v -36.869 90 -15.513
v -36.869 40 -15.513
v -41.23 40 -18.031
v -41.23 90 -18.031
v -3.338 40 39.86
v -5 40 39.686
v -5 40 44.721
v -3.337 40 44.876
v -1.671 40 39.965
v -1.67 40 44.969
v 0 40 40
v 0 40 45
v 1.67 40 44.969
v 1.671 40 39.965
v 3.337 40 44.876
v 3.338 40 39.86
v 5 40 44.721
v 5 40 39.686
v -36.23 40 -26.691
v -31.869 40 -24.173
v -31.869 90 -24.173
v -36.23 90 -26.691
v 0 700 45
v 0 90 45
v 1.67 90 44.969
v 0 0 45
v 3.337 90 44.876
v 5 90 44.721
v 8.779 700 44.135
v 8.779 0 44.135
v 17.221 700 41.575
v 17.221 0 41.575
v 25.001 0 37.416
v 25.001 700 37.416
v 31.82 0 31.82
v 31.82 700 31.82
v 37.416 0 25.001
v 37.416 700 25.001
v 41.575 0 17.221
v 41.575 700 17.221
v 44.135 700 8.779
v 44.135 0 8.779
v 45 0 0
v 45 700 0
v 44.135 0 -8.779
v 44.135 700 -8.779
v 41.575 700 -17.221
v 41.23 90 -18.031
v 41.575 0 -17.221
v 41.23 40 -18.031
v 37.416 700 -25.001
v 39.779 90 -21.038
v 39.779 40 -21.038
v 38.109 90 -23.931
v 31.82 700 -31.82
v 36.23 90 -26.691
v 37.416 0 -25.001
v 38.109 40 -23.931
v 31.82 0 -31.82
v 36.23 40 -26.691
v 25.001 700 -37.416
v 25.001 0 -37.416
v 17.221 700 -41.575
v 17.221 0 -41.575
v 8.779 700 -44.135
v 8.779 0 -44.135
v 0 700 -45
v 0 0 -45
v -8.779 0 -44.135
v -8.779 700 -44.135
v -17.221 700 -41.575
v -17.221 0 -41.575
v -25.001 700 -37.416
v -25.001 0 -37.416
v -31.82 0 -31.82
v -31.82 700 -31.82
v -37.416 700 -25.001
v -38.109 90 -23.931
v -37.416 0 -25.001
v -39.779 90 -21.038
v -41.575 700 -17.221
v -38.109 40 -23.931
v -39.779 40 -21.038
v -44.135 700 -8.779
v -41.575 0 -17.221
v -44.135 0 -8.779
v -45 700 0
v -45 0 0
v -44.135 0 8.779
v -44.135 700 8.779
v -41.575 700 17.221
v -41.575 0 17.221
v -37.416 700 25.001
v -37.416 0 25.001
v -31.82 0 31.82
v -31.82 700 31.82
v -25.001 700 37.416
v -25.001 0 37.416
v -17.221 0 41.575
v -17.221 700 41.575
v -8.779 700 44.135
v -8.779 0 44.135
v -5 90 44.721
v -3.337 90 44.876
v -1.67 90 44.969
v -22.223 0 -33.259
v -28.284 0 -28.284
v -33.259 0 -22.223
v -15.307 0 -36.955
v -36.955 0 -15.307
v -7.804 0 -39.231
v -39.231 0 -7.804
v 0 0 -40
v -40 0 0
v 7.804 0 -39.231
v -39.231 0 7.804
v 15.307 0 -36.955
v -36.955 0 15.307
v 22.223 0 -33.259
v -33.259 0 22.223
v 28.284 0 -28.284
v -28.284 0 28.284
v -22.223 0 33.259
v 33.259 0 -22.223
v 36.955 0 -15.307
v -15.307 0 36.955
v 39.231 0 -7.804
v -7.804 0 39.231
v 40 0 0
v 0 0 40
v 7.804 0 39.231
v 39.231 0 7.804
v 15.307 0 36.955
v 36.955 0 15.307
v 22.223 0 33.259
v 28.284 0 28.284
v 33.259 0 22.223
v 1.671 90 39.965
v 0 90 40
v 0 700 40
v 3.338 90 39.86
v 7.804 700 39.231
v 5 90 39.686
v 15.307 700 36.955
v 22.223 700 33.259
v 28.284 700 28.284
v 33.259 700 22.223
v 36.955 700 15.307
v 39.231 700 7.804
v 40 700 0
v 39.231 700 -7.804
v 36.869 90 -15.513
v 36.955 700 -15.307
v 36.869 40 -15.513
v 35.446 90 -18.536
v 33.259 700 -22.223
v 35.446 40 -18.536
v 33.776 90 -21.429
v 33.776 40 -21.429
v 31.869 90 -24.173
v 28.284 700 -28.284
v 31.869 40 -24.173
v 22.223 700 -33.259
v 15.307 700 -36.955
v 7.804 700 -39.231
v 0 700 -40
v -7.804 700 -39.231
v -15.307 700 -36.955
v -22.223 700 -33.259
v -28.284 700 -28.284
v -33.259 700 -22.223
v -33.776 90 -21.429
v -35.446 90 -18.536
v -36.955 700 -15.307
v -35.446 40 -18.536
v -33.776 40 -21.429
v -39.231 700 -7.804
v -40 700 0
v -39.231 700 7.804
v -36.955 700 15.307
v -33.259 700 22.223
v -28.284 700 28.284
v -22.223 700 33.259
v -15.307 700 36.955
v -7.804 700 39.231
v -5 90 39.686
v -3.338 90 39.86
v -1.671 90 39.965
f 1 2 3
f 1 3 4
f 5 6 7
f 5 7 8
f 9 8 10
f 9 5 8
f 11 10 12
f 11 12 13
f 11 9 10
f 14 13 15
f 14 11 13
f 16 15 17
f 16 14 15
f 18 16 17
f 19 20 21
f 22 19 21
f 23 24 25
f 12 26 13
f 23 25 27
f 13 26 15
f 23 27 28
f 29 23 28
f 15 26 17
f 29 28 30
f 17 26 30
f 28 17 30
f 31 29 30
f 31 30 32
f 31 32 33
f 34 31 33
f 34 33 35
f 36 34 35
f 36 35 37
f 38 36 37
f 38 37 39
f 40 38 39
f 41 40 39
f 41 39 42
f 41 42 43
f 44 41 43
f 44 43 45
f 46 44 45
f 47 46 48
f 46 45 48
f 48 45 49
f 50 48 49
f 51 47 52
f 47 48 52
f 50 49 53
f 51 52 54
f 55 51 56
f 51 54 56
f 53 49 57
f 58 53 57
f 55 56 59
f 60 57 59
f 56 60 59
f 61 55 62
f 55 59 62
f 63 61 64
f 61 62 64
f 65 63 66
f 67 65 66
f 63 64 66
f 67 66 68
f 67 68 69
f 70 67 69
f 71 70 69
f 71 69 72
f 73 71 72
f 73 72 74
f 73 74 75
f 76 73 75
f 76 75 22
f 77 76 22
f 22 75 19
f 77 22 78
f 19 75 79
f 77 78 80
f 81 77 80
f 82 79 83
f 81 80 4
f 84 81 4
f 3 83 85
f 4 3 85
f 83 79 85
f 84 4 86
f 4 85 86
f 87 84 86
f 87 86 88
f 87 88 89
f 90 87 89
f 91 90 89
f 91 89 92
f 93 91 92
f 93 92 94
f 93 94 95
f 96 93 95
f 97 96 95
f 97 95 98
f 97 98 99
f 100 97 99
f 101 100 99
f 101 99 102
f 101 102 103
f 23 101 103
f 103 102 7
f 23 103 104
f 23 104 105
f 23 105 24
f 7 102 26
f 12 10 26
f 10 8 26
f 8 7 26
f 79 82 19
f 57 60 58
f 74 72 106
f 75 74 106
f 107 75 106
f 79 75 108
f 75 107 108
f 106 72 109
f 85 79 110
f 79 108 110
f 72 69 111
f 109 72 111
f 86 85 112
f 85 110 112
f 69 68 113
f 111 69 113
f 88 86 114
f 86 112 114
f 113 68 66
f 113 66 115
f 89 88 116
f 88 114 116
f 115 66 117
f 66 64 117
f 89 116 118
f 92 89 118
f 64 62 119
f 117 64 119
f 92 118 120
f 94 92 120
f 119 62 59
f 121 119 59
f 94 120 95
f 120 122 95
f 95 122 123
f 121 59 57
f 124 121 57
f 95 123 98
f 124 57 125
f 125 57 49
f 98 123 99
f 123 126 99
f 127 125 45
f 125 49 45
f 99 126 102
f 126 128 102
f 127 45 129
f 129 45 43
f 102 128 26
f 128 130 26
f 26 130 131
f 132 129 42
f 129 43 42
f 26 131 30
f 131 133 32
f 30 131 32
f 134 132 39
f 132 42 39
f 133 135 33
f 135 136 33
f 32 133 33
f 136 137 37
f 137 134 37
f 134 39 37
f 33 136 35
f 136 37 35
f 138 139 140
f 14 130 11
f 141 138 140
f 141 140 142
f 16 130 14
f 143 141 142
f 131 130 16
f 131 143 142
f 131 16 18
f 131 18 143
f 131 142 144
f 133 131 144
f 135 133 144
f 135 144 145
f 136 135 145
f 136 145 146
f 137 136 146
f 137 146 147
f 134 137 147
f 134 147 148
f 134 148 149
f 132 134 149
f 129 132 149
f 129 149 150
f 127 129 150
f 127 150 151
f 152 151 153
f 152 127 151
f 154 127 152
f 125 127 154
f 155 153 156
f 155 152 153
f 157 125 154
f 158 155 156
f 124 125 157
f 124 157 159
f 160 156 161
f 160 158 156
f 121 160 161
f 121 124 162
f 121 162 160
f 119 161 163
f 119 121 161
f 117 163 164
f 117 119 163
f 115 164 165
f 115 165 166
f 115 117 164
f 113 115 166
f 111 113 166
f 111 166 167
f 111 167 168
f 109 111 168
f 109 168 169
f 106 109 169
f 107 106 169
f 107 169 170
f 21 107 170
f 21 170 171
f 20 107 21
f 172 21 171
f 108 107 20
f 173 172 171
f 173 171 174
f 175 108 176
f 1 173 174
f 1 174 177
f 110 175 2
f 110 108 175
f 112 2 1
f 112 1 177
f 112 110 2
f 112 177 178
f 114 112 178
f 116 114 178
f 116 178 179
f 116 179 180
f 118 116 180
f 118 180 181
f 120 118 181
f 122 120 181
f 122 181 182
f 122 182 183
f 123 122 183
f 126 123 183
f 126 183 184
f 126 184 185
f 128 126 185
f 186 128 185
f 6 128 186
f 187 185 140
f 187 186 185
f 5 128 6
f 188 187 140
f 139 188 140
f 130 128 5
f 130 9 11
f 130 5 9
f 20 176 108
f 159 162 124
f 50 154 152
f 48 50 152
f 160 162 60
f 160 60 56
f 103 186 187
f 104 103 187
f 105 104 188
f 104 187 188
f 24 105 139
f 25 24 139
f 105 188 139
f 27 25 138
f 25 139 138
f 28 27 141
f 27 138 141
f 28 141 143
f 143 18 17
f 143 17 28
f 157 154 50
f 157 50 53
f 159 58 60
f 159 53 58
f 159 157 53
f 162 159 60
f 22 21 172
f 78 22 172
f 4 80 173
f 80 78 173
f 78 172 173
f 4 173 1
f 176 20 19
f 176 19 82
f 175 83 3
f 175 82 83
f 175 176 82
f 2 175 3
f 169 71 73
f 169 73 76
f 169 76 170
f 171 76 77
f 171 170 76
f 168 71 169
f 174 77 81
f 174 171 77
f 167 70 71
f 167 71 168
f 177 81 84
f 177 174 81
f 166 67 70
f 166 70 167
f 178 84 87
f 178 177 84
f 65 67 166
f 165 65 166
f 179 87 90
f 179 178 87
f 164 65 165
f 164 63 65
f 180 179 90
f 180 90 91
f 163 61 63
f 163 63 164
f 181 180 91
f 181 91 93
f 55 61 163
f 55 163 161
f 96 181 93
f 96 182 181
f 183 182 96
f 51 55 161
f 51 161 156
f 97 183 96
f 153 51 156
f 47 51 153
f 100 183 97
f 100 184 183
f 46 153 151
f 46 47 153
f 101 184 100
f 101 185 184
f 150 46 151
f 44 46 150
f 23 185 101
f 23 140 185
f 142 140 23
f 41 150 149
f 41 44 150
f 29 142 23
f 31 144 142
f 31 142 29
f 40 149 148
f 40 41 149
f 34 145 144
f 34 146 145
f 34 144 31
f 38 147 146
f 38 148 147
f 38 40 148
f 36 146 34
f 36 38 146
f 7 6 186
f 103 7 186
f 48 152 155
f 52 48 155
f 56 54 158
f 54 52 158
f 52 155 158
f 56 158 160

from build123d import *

# Parameters (mm, degrees)
SKETCH1_R           = 45
SKETCH1_R_2         = 40
BOSS_EXTRUDE2_DEPTH = 700
SKETCH2_W           = 10
SKETCH2_H           = 50
CUT_EXTRUDE4_DEPTH  = 62
CIRPATTERN1_COUNT   = 3


with BuildPart() as part:
    # Sketch1 → Boss-Extrude2 (new body)
    with BuildSketch(Plane(origin=(0, 0, 0), x_dir=(1, 0, 0), z_dir=(0, 1, 0))):
        with Locations(Location((0, 0, 0), (0, 0, 270))):
            Circle(SKETCH1_R)
        with Locations(Location((0, 0, 0), (0, 0, 270))):
            Circle(SKETCH1_R_2, mode=Mode.SUBTRACT)
    extrude(amount=BOSS_EXTRUDE2_DEPTH)

    # Sketch2 → Cut-Extrude4 (cut)
    with BuildSketch(Plane.XY):
        with Locations((0, 65)):
            Rectangle(SKETCH2_W, SKETCH2_H)
    cut_extrude4 = extrude(amount=CUT_EXTRUDE4_DEPTH, mode=Mode.SUBTRACT)

    # CirPattern1: Cut-Extrude4 ×3 about axis
    cirpattern1_axis = Axis((0, 0, 0), (0, 1, 0))
    for i in range(1, CIRPATTERN1_COUNT):
        add(cut_extrude4.rotate(cirpattern1_axis, i * 360 / CIRPATTERN1_COUNT), mode=Mode.SUBTRACT)


solid = part.part
